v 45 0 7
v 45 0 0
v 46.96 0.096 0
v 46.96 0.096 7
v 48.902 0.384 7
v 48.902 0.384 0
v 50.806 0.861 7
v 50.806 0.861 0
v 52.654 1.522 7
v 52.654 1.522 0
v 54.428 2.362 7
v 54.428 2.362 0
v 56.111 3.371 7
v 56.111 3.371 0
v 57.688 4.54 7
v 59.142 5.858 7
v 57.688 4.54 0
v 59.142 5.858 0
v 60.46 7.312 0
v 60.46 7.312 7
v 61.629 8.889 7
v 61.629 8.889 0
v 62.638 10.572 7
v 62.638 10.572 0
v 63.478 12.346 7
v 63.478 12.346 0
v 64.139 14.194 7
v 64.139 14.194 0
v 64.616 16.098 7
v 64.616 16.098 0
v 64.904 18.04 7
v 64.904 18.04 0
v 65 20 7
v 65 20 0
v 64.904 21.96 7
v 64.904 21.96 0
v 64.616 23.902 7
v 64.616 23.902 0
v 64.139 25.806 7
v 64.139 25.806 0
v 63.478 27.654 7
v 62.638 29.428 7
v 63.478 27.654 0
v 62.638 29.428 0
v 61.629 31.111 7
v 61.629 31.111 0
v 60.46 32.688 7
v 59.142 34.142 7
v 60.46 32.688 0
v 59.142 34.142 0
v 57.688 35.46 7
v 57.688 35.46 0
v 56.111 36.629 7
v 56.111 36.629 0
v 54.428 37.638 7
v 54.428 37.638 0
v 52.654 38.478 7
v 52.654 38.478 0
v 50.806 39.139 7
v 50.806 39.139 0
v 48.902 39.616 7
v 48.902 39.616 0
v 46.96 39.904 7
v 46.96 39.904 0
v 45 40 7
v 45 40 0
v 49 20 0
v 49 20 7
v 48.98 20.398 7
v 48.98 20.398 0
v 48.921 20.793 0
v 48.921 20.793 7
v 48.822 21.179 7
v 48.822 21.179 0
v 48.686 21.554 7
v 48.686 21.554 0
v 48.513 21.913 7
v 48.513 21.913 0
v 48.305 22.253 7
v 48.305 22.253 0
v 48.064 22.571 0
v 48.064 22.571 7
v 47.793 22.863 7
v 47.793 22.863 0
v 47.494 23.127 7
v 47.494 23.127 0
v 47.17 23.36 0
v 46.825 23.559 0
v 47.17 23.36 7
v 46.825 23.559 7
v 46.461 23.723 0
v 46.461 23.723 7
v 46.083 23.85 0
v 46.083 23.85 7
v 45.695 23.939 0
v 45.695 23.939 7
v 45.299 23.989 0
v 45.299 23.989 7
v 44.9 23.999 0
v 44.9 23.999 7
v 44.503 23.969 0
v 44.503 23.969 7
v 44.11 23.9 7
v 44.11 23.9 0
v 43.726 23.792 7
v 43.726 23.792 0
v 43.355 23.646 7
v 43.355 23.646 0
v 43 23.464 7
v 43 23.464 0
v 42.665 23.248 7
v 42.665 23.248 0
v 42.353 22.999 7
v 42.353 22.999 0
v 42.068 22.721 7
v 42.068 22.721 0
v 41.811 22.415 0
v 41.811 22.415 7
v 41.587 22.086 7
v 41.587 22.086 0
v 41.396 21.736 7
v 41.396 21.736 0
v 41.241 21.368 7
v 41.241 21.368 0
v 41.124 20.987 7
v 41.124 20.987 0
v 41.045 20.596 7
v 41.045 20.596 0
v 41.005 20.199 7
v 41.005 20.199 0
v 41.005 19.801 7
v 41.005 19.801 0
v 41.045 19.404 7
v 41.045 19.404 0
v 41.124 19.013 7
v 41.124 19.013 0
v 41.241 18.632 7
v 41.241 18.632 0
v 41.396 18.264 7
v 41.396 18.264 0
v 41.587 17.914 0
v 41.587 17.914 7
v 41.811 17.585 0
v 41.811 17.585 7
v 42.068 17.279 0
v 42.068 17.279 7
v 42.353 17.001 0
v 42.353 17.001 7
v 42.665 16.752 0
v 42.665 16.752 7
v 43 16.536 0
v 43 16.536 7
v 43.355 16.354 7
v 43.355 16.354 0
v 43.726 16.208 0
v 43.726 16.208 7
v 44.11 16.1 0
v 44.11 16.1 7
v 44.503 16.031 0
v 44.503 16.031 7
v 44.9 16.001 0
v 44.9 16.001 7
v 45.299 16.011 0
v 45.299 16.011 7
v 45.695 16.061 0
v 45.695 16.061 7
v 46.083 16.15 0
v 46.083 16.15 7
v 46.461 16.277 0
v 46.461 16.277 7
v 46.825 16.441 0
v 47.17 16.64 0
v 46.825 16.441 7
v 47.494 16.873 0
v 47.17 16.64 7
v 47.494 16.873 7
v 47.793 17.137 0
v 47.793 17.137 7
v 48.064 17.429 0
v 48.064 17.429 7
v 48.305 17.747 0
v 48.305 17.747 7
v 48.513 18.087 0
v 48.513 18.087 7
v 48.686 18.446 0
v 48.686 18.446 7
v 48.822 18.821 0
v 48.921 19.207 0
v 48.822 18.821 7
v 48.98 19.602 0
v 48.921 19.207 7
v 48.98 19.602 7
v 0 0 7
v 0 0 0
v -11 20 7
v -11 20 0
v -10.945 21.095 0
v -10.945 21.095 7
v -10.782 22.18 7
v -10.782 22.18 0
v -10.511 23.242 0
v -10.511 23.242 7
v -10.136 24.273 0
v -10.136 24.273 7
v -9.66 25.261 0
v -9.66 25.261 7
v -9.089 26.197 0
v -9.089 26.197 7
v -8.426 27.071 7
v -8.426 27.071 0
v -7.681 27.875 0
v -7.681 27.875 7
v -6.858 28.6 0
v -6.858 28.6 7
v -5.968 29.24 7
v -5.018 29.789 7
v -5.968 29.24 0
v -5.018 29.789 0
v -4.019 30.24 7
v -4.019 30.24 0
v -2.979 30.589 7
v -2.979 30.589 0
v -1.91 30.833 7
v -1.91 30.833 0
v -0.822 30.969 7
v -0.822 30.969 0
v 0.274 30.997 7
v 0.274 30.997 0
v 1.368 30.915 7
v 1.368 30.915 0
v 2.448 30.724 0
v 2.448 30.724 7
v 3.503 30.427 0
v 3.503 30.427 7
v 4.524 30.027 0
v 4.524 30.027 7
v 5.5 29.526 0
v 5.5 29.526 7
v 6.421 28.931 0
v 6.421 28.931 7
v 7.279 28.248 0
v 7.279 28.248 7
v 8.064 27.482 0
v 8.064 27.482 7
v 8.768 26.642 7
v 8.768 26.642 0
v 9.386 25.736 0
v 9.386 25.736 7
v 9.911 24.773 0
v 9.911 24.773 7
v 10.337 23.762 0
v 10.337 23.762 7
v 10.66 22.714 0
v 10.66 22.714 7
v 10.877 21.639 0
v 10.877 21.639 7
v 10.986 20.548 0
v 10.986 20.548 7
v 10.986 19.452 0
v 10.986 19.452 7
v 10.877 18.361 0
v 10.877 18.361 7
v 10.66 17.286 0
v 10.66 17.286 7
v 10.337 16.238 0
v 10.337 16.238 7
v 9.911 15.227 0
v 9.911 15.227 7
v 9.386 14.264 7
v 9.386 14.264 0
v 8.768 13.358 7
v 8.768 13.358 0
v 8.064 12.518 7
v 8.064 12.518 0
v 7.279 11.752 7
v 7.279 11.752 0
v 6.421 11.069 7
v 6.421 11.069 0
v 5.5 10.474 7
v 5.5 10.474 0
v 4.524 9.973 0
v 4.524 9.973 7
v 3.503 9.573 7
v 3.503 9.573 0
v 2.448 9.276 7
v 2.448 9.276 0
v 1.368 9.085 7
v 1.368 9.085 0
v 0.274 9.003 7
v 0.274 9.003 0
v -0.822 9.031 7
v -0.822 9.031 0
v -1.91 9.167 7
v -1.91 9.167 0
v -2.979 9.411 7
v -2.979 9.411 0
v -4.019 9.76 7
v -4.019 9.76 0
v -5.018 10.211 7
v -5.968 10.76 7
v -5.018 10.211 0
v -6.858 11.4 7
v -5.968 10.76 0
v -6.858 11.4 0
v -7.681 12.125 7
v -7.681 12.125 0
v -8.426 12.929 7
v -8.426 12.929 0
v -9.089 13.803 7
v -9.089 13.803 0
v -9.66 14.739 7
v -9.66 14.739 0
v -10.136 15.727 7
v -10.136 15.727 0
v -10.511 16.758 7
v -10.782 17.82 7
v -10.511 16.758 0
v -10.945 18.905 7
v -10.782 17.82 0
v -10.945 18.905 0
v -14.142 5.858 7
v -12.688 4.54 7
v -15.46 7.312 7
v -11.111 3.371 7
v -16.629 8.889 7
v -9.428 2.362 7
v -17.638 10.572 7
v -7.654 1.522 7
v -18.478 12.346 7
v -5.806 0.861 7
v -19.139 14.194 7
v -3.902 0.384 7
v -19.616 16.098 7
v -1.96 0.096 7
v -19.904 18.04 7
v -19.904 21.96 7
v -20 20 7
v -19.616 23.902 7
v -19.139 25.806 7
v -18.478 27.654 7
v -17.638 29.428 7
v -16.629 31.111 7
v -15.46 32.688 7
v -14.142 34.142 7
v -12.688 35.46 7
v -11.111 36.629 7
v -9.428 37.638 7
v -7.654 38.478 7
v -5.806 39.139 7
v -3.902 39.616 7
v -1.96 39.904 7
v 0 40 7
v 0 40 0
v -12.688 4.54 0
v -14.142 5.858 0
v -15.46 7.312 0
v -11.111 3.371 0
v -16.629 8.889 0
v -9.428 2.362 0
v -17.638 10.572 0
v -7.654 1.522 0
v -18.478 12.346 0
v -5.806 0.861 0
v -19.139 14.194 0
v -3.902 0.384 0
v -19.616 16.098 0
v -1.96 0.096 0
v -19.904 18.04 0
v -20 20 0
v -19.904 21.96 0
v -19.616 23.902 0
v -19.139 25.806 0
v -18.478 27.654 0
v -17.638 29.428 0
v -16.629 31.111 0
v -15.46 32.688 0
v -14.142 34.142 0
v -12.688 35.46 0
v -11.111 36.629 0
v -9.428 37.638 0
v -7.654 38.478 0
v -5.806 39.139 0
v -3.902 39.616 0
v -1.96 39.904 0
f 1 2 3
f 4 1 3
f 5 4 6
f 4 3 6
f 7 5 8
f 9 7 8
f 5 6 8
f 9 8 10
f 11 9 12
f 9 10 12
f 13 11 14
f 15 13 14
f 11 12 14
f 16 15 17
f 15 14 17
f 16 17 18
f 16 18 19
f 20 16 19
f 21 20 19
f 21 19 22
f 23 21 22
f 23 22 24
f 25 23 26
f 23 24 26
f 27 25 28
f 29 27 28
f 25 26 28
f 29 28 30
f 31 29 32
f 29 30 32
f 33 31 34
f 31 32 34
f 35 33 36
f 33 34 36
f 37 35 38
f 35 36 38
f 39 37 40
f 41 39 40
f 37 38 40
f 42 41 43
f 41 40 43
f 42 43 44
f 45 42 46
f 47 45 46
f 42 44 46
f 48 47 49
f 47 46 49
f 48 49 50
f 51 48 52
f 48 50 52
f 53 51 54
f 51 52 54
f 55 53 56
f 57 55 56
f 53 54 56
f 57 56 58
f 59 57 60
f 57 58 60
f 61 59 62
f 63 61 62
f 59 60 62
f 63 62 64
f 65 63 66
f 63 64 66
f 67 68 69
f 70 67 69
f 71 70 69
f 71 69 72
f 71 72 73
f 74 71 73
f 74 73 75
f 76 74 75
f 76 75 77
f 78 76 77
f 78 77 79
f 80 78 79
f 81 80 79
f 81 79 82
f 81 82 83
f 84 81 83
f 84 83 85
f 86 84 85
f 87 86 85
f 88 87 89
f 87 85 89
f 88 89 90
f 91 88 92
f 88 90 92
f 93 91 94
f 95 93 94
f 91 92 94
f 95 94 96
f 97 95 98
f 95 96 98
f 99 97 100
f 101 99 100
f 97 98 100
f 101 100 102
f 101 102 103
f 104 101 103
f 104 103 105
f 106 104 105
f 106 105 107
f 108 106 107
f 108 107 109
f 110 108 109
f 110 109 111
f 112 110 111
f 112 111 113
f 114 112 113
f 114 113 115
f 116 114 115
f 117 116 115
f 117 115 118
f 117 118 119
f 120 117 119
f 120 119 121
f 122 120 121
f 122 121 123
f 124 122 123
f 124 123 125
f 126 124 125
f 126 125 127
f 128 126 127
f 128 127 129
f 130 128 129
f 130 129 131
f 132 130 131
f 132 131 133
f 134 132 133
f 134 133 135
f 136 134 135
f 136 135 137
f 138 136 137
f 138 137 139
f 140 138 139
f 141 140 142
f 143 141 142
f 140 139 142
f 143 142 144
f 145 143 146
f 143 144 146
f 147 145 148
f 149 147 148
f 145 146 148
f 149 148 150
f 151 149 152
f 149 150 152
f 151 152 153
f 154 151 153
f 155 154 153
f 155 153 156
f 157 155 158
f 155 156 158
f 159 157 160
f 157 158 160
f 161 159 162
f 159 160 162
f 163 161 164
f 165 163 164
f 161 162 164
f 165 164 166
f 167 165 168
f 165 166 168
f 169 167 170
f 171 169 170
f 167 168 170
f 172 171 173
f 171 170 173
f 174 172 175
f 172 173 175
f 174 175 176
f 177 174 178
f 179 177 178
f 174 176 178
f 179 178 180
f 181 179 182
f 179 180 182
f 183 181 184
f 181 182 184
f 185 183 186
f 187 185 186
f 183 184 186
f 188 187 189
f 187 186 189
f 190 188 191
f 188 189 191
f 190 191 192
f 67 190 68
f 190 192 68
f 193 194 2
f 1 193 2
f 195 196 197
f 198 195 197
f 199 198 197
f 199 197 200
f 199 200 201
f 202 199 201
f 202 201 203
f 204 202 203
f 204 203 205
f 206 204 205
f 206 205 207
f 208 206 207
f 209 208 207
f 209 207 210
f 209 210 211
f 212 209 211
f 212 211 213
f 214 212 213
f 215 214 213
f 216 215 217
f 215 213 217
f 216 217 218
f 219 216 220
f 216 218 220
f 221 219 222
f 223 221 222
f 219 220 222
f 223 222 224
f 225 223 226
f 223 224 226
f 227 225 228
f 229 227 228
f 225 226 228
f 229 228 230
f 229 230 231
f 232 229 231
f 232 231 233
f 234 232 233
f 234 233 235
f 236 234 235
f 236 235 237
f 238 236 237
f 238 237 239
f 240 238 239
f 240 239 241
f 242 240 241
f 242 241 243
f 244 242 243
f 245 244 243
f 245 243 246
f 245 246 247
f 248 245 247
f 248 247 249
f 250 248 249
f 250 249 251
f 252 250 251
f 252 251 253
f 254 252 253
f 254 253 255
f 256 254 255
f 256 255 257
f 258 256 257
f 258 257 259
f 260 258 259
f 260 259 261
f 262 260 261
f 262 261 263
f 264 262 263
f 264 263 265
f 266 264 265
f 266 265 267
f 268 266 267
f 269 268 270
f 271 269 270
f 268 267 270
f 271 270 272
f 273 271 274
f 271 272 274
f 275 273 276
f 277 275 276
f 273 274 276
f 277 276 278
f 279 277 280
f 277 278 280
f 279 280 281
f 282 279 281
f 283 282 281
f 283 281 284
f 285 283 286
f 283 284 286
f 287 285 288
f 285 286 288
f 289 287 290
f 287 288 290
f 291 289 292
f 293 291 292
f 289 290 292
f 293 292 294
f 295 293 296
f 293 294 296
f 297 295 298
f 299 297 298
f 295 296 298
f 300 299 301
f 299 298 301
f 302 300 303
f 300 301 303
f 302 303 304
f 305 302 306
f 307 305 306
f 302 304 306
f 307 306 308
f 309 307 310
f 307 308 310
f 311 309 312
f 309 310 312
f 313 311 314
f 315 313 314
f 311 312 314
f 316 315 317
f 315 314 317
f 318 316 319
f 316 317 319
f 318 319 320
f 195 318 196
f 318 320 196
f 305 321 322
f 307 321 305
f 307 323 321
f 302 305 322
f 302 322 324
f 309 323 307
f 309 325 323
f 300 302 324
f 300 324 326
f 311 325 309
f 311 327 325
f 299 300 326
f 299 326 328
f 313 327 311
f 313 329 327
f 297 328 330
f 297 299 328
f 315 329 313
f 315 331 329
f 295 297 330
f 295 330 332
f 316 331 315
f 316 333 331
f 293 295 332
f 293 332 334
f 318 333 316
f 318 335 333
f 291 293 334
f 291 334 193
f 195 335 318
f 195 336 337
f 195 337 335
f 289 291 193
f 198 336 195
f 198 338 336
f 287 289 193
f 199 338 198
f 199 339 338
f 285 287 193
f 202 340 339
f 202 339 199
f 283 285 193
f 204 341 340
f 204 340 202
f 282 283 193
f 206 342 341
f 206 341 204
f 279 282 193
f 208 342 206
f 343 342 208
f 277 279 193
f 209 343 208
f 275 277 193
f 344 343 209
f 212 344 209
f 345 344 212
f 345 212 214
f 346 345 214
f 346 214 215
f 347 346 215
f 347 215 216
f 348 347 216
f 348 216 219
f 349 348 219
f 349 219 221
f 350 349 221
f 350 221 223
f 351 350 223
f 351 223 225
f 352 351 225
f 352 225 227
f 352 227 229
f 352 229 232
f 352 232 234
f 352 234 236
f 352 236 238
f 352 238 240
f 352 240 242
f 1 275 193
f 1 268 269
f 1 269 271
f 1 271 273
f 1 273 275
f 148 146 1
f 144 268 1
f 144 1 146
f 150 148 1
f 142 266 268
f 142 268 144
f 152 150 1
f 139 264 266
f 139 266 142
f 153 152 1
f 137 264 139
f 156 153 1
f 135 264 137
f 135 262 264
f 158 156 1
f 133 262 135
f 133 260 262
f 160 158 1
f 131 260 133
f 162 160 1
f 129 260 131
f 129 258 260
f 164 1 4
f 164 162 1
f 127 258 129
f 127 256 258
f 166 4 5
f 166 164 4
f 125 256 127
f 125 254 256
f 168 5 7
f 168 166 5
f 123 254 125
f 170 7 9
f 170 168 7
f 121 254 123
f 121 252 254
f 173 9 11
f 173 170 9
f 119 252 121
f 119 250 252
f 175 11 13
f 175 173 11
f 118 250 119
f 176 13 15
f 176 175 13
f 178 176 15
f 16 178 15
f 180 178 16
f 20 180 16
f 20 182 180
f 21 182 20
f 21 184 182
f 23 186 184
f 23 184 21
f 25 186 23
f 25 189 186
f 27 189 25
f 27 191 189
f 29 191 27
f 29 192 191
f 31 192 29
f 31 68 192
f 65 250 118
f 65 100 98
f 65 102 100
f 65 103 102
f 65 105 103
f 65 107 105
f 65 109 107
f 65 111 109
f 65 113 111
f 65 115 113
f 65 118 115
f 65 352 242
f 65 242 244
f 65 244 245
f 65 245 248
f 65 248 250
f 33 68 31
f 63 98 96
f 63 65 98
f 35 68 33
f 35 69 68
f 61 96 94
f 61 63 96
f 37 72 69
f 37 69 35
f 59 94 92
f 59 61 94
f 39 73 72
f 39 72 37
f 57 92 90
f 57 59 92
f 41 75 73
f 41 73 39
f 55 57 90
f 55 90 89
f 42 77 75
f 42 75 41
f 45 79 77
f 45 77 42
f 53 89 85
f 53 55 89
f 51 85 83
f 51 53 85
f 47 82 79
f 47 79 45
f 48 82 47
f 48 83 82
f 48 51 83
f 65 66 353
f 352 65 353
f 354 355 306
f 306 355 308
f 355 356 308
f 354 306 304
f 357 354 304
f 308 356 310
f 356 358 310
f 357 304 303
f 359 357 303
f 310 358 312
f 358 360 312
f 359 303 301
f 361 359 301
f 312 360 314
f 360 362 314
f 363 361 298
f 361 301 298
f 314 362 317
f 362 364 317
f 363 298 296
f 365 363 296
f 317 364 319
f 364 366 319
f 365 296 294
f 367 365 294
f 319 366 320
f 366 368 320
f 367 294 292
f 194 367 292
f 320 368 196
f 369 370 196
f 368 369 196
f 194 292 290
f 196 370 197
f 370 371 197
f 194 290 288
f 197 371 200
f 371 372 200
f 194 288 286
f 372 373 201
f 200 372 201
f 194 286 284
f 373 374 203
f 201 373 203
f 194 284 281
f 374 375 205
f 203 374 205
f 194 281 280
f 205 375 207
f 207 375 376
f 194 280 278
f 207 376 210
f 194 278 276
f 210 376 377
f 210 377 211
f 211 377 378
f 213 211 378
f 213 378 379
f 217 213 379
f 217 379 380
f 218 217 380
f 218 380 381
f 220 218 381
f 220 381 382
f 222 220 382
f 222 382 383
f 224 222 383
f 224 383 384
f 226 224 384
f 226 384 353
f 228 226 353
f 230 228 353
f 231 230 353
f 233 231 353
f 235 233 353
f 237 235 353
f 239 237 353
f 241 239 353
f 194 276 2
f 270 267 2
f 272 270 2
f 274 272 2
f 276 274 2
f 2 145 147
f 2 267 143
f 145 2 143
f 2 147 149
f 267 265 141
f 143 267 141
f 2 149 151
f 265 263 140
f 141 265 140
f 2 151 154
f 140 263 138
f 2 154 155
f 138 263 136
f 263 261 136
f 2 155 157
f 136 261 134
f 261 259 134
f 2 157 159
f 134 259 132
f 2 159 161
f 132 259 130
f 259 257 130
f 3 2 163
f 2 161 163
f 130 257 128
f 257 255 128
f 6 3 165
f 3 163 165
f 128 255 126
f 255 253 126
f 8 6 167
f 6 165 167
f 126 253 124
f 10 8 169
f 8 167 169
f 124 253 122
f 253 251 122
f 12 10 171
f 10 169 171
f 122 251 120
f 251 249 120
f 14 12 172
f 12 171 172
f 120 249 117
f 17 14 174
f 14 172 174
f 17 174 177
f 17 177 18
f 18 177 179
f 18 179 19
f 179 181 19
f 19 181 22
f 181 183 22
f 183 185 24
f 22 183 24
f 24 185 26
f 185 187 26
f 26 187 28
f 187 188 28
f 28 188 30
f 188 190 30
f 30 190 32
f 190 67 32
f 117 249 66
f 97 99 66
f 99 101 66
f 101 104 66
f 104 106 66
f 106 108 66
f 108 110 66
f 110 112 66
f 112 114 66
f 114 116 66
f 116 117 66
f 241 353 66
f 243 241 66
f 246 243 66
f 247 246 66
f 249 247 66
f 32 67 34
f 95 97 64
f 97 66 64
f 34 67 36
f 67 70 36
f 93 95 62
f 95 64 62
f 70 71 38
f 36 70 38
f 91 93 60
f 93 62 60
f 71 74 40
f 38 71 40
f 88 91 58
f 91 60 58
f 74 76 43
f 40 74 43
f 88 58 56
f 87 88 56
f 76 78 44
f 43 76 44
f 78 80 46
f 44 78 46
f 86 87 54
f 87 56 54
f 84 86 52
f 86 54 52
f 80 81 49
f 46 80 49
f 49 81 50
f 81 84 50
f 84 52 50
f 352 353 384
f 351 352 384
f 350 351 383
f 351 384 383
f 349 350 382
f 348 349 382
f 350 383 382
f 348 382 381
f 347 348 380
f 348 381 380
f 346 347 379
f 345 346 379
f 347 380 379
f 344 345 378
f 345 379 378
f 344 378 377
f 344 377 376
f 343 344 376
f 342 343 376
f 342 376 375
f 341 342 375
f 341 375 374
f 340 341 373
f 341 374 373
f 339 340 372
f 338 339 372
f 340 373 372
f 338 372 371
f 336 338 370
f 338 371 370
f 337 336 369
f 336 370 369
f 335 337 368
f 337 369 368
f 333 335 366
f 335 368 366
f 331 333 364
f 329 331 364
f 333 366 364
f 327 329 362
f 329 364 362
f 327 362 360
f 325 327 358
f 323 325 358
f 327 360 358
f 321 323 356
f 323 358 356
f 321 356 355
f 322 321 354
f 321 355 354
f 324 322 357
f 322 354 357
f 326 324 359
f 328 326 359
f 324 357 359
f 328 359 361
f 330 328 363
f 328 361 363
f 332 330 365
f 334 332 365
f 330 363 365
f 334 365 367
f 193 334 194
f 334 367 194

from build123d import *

# Parameters (mm, degrees)
BOSS_EXTRUDE1_DEPTH = 7
SKETCH4_R           = 11
CUT_EXTRUDE1_DEPTH  = 8
SKETCH7_R           = 4
CUT_EXTRUDE2_DEPTH  = 8


with BuildPart() as part:
    # Sketch2 → Boss-Extrude1 (new body)
    with BuildSketch(Plane.XY):
        with BuildLine():
            Line((0, 0), (45, 0))
            ThreePointArc((45, 0), (65, 20), (45, 40))
            Line((45, 40), (0, 40))
            ThreePointArc((0, 40), (-20, 20), (0, 0))
        make_face()
    extrude(amount=BOSS_EXTRUDE1_DEPTH)

    # Sketch4 → Cut-Extrude1 (cut, through all)
    with BuildSketch(Plane(origin=(0, 0, 0), x_dir=(-1, 0, 0), z_dir=(0, 0, -1))):
        with Locations((0, 20)):
            Circle(SKETCH4_R)
    extrude(amount=-CUT_EXTRUDE1_DEPTH, mode=Mode.SUBTRACT)

    # Sketch7 → Cut-Extrude2 (cut, through all)
    with BuildSketch(Plane.XY.offset(7)):
        with Locations((45, 20)):
            Circle(SKETCH7_R)
    extrude(amount=-CUT_EXTRUDE2_DEPTH, mode=Mode.SUBTRACT)


solid = part.part
